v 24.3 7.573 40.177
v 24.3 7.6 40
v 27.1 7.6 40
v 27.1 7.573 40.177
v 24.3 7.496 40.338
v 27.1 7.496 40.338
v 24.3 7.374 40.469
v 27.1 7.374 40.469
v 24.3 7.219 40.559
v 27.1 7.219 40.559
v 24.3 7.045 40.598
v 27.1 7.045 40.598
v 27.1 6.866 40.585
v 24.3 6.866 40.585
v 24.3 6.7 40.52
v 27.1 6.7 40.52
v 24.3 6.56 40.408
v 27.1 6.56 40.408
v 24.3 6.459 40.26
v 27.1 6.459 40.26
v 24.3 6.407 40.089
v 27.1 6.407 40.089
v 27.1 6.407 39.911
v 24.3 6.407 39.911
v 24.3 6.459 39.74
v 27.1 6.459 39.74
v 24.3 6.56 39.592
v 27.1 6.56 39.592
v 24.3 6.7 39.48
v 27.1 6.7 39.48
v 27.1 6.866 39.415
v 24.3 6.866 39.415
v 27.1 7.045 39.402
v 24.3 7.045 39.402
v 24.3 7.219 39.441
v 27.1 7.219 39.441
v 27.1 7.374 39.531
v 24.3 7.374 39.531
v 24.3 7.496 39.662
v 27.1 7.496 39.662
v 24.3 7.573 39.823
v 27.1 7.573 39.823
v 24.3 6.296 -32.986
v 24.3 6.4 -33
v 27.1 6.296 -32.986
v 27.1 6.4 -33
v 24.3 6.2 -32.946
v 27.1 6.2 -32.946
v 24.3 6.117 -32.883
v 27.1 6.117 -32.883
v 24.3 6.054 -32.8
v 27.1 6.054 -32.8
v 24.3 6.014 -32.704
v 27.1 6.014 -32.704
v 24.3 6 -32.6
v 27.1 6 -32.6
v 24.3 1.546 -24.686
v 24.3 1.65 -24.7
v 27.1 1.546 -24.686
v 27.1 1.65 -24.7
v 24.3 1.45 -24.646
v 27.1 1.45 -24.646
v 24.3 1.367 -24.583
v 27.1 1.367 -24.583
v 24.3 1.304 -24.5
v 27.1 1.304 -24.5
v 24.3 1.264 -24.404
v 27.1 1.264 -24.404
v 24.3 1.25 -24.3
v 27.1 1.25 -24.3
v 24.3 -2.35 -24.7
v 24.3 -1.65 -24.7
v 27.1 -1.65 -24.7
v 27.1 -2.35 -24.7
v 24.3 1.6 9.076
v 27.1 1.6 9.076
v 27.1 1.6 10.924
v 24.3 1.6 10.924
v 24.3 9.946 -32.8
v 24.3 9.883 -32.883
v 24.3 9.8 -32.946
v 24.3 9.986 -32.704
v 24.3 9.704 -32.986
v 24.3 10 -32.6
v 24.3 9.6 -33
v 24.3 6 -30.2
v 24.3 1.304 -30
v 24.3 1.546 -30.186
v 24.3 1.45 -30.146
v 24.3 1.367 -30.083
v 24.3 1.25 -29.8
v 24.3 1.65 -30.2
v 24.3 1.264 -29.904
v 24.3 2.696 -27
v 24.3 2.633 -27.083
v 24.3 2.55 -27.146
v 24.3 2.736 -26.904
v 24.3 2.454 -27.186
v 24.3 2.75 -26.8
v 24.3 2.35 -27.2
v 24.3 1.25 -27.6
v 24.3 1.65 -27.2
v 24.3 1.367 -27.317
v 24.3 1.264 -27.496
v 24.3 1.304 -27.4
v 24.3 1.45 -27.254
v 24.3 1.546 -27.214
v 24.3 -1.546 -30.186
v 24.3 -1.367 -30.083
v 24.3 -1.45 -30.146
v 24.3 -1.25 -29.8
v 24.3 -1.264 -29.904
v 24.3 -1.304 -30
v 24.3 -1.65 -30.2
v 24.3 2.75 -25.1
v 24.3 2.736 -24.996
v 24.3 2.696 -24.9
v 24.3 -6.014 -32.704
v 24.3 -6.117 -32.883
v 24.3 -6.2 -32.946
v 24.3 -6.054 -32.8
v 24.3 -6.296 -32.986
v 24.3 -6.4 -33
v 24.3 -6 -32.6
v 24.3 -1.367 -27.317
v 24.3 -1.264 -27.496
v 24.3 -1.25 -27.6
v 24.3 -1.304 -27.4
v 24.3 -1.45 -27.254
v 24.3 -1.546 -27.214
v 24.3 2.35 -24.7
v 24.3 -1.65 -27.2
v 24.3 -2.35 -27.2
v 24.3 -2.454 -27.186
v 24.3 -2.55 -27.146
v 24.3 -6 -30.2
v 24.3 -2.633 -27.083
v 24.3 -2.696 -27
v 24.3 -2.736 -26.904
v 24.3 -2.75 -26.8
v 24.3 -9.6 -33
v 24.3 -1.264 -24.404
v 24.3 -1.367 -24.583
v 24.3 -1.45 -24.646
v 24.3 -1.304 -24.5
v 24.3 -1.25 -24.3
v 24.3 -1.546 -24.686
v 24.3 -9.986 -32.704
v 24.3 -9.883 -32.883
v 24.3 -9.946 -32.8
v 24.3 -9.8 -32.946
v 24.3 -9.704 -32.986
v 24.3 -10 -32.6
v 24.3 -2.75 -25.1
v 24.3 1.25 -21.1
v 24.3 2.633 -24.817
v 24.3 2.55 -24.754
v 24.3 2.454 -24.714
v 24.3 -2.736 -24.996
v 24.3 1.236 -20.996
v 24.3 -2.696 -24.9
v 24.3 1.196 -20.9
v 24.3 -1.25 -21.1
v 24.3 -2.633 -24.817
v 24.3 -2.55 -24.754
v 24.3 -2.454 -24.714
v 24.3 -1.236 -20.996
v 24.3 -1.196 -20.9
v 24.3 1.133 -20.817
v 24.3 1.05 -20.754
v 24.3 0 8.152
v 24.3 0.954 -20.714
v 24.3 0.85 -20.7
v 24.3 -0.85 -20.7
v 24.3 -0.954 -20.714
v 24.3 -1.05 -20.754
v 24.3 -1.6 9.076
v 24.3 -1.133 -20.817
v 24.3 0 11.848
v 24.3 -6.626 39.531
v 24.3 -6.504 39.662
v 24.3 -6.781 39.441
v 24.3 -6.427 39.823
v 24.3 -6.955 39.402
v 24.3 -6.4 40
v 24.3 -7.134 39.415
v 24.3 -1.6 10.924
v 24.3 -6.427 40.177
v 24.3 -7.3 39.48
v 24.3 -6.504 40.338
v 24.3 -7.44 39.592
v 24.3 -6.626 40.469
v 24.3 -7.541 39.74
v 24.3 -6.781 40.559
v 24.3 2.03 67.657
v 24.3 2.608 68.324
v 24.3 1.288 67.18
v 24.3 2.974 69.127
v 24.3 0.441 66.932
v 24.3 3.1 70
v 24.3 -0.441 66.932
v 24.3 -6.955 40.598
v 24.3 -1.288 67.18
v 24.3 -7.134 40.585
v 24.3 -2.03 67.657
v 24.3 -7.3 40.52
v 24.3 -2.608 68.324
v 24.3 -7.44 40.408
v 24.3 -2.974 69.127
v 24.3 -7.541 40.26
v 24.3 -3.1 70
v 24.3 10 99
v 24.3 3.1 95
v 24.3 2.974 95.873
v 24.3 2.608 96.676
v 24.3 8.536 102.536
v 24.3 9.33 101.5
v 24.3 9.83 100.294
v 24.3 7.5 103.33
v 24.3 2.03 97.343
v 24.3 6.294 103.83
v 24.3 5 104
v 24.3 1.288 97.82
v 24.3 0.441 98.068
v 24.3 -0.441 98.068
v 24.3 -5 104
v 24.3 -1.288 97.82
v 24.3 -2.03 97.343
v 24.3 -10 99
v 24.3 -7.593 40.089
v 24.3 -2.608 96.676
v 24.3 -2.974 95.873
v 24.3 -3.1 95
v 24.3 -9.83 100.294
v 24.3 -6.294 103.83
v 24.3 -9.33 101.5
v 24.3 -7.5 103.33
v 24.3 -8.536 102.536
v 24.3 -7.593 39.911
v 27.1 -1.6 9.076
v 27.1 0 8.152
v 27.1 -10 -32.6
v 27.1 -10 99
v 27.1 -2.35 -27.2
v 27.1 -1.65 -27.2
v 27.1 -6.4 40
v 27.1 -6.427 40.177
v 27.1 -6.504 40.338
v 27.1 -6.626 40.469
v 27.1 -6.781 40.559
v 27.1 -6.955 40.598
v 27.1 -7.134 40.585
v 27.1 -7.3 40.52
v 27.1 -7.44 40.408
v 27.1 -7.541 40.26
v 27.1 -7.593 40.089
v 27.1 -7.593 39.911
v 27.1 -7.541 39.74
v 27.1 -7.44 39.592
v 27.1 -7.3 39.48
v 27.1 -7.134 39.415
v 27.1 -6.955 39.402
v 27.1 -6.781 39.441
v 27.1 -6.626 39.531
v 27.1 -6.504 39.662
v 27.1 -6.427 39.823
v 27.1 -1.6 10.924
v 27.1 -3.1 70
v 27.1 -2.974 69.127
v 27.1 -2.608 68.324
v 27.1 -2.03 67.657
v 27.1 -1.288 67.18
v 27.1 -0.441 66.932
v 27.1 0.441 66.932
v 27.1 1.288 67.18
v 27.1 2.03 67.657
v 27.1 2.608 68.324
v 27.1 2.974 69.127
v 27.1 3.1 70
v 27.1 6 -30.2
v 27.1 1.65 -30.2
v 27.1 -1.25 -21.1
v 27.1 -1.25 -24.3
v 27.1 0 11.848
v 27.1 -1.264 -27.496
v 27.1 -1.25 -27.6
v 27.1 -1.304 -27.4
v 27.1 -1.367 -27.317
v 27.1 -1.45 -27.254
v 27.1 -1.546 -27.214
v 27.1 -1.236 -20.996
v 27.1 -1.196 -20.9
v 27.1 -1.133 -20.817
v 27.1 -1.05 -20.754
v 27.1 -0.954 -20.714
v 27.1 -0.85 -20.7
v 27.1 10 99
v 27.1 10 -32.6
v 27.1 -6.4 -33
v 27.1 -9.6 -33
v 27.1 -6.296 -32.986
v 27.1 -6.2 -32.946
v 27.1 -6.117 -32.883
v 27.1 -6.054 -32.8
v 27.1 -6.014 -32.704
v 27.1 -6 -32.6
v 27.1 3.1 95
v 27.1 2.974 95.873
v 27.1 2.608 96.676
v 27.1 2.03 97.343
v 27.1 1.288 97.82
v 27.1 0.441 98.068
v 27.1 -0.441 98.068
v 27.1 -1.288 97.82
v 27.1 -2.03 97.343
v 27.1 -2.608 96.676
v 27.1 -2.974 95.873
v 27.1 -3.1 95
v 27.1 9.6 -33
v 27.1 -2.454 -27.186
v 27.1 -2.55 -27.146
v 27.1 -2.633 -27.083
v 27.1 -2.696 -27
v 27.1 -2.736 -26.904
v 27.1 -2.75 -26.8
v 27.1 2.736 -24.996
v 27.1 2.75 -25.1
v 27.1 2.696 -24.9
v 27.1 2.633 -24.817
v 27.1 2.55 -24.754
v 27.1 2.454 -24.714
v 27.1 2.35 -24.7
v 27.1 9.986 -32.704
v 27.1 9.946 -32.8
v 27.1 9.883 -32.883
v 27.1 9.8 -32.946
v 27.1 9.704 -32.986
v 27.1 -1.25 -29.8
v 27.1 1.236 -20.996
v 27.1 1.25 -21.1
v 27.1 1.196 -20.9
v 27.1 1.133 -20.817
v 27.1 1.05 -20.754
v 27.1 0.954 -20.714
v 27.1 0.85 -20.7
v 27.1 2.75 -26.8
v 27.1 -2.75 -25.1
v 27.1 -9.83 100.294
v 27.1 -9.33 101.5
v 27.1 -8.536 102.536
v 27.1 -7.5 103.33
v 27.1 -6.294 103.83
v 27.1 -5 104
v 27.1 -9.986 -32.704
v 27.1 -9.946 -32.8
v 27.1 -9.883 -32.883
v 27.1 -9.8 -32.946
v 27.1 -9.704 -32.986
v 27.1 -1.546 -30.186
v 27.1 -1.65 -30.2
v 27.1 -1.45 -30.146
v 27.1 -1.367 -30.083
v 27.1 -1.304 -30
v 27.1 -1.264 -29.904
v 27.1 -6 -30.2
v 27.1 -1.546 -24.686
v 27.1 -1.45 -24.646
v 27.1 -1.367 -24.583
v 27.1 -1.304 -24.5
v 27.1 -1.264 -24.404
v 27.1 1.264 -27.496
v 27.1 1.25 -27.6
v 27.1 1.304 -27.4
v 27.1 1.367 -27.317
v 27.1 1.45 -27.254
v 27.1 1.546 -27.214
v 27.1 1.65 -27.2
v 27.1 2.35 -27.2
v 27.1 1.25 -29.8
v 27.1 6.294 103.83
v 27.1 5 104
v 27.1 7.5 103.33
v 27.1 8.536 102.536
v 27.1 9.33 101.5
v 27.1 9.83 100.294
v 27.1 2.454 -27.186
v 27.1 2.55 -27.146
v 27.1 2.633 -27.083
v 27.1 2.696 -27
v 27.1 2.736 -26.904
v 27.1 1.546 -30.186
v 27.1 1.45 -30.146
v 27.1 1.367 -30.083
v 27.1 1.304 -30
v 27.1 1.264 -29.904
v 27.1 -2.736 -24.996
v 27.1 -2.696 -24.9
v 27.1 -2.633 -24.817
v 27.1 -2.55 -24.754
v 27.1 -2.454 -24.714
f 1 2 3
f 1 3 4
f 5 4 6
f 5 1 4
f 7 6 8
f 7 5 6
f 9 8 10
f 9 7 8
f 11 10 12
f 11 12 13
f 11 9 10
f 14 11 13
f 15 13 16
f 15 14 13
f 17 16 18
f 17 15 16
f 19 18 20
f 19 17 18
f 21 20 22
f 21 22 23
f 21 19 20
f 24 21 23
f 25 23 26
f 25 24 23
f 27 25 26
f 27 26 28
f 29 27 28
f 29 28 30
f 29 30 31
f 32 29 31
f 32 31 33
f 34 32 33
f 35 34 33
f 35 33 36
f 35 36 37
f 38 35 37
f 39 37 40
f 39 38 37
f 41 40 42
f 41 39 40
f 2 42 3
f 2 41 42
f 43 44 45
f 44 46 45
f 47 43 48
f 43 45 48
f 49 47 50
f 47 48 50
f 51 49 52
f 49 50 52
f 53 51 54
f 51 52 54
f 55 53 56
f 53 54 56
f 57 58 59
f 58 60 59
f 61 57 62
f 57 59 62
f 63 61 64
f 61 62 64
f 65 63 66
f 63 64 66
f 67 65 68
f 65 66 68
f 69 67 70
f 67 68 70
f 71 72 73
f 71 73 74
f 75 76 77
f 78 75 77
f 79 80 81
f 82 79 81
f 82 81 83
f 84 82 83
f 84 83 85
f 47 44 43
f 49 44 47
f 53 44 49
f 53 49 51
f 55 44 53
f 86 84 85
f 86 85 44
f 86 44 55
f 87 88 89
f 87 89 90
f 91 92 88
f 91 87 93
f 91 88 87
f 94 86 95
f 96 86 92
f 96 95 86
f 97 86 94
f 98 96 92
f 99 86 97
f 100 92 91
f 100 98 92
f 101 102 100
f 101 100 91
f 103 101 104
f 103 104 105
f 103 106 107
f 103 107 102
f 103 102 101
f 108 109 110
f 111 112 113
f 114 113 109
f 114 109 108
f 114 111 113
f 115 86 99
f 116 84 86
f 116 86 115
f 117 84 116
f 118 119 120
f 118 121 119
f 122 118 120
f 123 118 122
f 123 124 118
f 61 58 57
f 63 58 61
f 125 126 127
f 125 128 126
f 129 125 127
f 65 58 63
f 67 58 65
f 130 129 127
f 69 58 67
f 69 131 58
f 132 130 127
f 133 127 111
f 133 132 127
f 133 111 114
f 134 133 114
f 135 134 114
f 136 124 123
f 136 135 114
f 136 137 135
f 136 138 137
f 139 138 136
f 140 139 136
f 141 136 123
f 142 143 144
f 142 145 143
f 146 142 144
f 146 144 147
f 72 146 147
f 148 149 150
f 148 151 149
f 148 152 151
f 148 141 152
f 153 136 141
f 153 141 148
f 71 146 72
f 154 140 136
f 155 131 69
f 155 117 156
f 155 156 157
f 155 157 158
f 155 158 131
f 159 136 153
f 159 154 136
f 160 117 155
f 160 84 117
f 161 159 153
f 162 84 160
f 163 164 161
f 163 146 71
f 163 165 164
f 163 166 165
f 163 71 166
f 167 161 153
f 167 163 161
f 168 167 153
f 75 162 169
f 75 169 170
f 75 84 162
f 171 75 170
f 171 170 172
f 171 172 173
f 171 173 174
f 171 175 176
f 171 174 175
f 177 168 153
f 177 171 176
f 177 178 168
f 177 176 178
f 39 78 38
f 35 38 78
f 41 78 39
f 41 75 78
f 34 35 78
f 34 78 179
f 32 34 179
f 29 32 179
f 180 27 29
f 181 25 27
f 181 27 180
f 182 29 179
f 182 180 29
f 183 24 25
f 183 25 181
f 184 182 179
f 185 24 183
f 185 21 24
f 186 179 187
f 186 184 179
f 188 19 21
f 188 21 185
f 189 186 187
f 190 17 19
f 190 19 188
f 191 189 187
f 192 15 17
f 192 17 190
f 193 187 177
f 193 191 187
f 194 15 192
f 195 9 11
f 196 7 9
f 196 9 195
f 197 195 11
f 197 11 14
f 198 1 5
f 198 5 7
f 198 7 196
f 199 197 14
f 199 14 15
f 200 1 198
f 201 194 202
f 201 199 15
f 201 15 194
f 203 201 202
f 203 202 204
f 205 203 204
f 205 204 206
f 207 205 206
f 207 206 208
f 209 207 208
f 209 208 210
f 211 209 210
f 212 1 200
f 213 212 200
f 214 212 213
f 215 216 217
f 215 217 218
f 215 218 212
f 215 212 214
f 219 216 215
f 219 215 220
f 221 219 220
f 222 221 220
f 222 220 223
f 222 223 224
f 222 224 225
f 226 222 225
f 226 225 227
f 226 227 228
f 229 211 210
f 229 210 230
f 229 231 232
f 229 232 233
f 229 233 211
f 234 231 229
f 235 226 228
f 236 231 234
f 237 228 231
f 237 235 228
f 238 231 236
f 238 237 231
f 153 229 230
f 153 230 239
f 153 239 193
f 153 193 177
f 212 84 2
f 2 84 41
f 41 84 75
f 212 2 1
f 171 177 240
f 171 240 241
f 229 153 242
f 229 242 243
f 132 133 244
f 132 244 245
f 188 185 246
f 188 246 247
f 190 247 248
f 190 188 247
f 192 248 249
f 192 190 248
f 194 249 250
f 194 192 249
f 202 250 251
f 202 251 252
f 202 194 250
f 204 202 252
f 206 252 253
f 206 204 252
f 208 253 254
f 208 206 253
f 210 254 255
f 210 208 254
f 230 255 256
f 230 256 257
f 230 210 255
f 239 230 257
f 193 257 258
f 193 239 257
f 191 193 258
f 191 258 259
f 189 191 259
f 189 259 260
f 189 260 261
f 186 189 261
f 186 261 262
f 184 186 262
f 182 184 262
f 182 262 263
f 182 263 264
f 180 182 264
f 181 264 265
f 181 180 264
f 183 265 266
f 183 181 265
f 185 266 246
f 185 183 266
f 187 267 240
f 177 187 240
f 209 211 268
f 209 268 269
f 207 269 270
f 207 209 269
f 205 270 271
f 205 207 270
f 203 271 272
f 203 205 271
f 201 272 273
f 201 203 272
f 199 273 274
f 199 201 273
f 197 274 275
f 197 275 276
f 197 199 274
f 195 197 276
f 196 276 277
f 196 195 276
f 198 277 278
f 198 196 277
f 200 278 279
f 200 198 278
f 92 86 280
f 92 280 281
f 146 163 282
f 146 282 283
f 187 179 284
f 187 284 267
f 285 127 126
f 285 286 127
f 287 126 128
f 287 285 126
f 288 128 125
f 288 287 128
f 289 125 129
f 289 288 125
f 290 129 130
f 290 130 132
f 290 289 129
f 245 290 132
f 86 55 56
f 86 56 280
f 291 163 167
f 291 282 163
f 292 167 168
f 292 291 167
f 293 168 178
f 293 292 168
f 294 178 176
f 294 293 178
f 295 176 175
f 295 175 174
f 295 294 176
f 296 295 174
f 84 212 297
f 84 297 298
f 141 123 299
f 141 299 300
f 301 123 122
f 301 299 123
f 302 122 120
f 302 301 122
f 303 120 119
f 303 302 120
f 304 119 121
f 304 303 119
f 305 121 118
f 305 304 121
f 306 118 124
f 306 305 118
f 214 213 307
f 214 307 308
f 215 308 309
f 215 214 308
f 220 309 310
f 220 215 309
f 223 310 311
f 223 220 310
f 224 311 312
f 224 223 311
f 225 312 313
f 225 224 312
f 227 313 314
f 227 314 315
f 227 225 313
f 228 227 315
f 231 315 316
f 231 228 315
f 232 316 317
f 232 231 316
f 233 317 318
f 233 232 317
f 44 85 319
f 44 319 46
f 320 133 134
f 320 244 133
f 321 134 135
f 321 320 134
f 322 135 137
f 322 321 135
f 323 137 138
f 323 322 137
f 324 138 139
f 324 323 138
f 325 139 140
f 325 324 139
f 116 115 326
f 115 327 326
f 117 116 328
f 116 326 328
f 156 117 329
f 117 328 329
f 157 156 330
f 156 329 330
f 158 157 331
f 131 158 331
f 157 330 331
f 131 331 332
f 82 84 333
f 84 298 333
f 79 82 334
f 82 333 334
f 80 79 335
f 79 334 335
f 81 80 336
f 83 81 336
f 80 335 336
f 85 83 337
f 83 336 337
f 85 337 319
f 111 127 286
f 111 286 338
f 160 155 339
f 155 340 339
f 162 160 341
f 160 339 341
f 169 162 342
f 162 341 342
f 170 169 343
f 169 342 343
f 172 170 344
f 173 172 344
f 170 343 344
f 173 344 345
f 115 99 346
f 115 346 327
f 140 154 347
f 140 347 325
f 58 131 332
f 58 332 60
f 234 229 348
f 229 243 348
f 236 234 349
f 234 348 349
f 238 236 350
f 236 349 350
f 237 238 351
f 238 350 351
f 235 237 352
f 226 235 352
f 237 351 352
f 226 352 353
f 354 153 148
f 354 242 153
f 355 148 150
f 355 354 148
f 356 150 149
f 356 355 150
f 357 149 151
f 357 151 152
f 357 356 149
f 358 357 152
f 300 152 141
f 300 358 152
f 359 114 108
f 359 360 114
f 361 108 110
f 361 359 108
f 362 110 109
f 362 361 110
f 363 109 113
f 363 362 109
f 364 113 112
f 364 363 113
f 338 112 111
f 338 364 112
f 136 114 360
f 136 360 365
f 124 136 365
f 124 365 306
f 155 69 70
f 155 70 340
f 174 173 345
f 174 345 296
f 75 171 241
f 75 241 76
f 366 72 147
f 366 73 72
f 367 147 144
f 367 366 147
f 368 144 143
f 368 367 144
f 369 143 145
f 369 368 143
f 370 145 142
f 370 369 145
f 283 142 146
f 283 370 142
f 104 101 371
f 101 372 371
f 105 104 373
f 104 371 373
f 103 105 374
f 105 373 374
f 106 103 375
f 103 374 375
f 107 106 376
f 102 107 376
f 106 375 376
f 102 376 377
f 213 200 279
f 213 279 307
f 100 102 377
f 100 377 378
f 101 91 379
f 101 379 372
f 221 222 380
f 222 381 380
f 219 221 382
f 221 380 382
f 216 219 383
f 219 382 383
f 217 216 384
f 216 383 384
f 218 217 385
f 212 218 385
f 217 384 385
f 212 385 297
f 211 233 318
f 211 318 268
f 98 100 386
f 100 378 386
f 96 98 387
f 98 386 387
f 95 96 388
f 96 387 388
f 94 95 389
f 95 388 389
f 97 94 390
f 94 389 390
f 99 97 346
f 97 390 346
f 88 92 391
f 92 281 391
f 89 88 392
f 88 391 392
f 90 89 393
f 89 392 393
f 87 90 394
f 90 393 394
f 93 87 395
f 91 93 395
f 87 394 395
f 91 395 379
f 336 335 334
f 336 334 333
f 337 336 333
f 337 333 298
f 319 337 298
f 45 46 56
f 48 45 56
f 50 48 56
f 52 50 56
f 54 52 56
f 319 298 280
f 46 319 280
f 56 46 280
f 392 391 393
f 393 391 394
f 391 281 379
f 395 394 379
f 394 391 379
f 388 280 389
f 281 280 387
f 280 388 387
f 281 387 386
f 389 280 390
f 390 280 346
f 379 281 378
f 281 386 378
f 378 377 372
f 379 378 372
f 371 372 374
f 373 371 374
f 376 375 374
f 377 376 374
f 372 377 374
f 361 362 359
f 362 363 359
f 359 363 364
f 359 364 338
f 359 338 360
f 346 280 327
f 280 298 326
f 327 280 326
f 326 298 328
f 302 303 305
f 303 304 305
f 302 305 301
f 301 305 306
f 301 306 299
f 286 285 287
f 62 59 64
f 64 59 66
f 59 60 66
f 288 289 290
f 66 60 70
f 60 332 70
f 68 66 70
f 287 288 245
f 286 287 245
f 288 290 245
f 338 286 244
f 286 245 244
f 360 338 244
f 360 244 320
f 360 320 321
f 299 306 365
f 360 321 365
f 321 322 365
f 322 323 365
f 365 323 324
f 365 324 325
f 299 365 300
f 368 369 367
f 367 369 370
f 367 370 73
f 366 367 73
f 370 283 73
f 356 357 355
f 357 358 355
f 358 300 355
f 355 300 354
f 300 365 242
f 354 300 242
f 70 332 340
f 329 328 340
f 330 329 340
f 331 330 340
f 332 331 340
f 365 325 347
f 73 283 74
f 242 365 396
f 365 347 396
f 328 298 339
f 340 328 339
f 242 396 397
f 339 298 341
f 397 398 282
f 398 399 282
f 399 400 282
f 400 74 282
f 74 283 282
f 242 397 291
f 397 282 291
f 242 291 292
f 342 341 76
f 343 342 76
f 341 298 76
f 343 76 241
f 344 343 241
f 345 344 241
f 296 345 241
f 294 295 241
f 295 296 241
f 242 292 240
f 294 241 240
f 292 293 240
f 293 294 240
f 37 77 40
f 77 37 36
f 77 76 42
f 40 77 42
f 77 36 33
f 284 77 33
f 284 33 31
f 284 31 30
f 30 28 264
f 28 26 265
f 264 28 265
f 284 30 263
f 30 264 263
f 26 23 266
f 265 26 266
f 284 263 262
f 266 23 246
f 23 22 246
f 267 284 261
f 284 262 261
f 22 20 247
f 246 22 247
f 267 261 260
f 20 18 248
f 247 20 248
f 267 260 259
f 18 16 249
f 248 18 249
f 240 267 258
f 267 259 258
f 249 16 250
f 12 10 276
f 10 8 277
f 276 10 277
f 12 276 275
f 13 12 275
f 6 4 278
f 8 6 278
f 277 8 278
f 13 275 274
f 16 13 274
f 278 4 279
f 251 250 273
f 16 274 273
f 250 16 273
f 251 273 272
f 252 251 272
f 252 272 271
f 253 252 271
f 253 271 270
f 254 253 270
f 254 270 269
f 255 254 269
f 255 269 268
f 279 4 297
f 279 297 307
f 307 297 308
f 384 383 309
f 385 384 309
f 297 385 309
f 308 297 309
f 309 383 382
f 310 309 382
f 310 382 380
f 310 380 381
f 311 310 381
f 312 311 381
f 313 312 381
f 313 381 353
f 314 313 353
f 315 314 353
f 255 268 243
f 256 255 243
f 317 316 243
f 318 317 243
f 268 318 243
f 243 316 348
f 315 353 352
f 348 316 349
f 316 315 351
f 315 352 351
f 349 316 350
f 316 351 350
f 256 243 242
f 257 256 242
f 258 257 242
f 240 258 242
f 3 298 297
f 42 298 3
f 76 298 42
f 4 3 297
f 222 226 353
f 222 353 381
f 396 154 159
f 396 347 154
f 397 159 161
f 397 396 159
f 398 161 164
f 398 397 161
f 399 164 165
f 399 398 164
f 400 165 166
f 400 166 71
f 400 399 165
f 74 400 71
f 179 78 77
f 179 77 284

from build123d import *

# Parameters (mm, degrees)
SKETCH001_R             = 0.6
PAD004_DEPTH            = 2.8
FILLET_R                = 0.4
FILLET001_R             = 5
BODY014_PLACEMENT_ANGLE = 180


with BuildPart() as part:
    # Sketch001 (on DatumPlane) → Pad004 (new body)
    with BuildSketch(Plane(origin=(-24.3, 0, 0), x_dir=(0, -1, 0), z_dir=(-1, 0, 0))):
        Polygon((-10, 84), (10, 84), (10, -53), (6, -53), (6, -50.2), (1.25, -50.2), (1.25, -47.2), (2.75, -47.2), (2.75, -44.7), (1.25, -44.7), (1.25, -40.7), (-1.25, -40.7), (-1.25, -44.7), (-2.75, -44.7), (-2.75, -47.2), (-1.25, -47.2), (-1.25, -50.2), (-6, -50.2), (-6, -53), (-10, -53), align=None)
        with Locations((-7, 20)):
            Circle(SKETCH001_R, mode=Mode.SUBTRACT)
        with Locations((7, 20)):
            Circle(SKETCH001_R, mode=Mode.SUBTRACT)
        Polygon((1.6, -9.07624), (0, -8.152479), (-1.6, -9.07624), (-1.6, -10.92376), (0, -11.847521), (1.6, -10.92376), align=None, mode=Mode.SUBTRACT)
        with BuildLine():
            ThreePointArc((3.1, 75), (0, 78.1), (-3.1, 75))
            Line((-3.1, 75), (-3.1, 50))
            ThreePointArc((-3.1, 50), (0, 46.9), (3.1, 50))
            Line((3.1, 50), (3.1, 75))
        make_face(mode=Mode.SUBTRACT)
    extrude(amount=PAD004_DEPTH)

    # Fillet
    fillet_edges = [part.edges().sort_by_distance(p)[0] for p in [
        (-25.7, 10, -53),
        (-25.7, 6, -53),
        (-25.7, -10, -53),
        (-25.7, -6, -53),
        (-25.7, 1.25, -50.2),
        (-25.7, -1.25, -50.2),
        (-25.7, 1.25, -40.7),
        (-25.7, -1.25, -40.7),
        (-25.7, 1.25, -47.2),
        (-25.7, -1.25, -47.2),
        (-25.7, 1.25, -44.7),
        (-25.7, -1.25, -44.7),
        (-25.7, -2.75, -47.2),
        (-25.7, 2.75, -47.2),
        (-25.7, 2.75, -44.7),
        (-25.7, -2.75, -44.7),
    ]]
    fillet(fillet_edges, radius=FILLET_R)

    # Fillet001
    fillet001_edges = [part.edges().sort_by_distance(p)[0] for p in [
        (-25.7, 10, 84),
        (-25.7, -10, 84),
    ]]
    fillet(fillet001_edges, radius=FILLET001_R)


with BuildPart() as part_1:
    # Body014 placement: moved
    add(part.part.moved(Location((0, 0, 20))).rotate(Axis((0, 0, 20), (0, 0, 1)), BODY014_PLACEMENT_ANGLE))


solid = part_1.part
